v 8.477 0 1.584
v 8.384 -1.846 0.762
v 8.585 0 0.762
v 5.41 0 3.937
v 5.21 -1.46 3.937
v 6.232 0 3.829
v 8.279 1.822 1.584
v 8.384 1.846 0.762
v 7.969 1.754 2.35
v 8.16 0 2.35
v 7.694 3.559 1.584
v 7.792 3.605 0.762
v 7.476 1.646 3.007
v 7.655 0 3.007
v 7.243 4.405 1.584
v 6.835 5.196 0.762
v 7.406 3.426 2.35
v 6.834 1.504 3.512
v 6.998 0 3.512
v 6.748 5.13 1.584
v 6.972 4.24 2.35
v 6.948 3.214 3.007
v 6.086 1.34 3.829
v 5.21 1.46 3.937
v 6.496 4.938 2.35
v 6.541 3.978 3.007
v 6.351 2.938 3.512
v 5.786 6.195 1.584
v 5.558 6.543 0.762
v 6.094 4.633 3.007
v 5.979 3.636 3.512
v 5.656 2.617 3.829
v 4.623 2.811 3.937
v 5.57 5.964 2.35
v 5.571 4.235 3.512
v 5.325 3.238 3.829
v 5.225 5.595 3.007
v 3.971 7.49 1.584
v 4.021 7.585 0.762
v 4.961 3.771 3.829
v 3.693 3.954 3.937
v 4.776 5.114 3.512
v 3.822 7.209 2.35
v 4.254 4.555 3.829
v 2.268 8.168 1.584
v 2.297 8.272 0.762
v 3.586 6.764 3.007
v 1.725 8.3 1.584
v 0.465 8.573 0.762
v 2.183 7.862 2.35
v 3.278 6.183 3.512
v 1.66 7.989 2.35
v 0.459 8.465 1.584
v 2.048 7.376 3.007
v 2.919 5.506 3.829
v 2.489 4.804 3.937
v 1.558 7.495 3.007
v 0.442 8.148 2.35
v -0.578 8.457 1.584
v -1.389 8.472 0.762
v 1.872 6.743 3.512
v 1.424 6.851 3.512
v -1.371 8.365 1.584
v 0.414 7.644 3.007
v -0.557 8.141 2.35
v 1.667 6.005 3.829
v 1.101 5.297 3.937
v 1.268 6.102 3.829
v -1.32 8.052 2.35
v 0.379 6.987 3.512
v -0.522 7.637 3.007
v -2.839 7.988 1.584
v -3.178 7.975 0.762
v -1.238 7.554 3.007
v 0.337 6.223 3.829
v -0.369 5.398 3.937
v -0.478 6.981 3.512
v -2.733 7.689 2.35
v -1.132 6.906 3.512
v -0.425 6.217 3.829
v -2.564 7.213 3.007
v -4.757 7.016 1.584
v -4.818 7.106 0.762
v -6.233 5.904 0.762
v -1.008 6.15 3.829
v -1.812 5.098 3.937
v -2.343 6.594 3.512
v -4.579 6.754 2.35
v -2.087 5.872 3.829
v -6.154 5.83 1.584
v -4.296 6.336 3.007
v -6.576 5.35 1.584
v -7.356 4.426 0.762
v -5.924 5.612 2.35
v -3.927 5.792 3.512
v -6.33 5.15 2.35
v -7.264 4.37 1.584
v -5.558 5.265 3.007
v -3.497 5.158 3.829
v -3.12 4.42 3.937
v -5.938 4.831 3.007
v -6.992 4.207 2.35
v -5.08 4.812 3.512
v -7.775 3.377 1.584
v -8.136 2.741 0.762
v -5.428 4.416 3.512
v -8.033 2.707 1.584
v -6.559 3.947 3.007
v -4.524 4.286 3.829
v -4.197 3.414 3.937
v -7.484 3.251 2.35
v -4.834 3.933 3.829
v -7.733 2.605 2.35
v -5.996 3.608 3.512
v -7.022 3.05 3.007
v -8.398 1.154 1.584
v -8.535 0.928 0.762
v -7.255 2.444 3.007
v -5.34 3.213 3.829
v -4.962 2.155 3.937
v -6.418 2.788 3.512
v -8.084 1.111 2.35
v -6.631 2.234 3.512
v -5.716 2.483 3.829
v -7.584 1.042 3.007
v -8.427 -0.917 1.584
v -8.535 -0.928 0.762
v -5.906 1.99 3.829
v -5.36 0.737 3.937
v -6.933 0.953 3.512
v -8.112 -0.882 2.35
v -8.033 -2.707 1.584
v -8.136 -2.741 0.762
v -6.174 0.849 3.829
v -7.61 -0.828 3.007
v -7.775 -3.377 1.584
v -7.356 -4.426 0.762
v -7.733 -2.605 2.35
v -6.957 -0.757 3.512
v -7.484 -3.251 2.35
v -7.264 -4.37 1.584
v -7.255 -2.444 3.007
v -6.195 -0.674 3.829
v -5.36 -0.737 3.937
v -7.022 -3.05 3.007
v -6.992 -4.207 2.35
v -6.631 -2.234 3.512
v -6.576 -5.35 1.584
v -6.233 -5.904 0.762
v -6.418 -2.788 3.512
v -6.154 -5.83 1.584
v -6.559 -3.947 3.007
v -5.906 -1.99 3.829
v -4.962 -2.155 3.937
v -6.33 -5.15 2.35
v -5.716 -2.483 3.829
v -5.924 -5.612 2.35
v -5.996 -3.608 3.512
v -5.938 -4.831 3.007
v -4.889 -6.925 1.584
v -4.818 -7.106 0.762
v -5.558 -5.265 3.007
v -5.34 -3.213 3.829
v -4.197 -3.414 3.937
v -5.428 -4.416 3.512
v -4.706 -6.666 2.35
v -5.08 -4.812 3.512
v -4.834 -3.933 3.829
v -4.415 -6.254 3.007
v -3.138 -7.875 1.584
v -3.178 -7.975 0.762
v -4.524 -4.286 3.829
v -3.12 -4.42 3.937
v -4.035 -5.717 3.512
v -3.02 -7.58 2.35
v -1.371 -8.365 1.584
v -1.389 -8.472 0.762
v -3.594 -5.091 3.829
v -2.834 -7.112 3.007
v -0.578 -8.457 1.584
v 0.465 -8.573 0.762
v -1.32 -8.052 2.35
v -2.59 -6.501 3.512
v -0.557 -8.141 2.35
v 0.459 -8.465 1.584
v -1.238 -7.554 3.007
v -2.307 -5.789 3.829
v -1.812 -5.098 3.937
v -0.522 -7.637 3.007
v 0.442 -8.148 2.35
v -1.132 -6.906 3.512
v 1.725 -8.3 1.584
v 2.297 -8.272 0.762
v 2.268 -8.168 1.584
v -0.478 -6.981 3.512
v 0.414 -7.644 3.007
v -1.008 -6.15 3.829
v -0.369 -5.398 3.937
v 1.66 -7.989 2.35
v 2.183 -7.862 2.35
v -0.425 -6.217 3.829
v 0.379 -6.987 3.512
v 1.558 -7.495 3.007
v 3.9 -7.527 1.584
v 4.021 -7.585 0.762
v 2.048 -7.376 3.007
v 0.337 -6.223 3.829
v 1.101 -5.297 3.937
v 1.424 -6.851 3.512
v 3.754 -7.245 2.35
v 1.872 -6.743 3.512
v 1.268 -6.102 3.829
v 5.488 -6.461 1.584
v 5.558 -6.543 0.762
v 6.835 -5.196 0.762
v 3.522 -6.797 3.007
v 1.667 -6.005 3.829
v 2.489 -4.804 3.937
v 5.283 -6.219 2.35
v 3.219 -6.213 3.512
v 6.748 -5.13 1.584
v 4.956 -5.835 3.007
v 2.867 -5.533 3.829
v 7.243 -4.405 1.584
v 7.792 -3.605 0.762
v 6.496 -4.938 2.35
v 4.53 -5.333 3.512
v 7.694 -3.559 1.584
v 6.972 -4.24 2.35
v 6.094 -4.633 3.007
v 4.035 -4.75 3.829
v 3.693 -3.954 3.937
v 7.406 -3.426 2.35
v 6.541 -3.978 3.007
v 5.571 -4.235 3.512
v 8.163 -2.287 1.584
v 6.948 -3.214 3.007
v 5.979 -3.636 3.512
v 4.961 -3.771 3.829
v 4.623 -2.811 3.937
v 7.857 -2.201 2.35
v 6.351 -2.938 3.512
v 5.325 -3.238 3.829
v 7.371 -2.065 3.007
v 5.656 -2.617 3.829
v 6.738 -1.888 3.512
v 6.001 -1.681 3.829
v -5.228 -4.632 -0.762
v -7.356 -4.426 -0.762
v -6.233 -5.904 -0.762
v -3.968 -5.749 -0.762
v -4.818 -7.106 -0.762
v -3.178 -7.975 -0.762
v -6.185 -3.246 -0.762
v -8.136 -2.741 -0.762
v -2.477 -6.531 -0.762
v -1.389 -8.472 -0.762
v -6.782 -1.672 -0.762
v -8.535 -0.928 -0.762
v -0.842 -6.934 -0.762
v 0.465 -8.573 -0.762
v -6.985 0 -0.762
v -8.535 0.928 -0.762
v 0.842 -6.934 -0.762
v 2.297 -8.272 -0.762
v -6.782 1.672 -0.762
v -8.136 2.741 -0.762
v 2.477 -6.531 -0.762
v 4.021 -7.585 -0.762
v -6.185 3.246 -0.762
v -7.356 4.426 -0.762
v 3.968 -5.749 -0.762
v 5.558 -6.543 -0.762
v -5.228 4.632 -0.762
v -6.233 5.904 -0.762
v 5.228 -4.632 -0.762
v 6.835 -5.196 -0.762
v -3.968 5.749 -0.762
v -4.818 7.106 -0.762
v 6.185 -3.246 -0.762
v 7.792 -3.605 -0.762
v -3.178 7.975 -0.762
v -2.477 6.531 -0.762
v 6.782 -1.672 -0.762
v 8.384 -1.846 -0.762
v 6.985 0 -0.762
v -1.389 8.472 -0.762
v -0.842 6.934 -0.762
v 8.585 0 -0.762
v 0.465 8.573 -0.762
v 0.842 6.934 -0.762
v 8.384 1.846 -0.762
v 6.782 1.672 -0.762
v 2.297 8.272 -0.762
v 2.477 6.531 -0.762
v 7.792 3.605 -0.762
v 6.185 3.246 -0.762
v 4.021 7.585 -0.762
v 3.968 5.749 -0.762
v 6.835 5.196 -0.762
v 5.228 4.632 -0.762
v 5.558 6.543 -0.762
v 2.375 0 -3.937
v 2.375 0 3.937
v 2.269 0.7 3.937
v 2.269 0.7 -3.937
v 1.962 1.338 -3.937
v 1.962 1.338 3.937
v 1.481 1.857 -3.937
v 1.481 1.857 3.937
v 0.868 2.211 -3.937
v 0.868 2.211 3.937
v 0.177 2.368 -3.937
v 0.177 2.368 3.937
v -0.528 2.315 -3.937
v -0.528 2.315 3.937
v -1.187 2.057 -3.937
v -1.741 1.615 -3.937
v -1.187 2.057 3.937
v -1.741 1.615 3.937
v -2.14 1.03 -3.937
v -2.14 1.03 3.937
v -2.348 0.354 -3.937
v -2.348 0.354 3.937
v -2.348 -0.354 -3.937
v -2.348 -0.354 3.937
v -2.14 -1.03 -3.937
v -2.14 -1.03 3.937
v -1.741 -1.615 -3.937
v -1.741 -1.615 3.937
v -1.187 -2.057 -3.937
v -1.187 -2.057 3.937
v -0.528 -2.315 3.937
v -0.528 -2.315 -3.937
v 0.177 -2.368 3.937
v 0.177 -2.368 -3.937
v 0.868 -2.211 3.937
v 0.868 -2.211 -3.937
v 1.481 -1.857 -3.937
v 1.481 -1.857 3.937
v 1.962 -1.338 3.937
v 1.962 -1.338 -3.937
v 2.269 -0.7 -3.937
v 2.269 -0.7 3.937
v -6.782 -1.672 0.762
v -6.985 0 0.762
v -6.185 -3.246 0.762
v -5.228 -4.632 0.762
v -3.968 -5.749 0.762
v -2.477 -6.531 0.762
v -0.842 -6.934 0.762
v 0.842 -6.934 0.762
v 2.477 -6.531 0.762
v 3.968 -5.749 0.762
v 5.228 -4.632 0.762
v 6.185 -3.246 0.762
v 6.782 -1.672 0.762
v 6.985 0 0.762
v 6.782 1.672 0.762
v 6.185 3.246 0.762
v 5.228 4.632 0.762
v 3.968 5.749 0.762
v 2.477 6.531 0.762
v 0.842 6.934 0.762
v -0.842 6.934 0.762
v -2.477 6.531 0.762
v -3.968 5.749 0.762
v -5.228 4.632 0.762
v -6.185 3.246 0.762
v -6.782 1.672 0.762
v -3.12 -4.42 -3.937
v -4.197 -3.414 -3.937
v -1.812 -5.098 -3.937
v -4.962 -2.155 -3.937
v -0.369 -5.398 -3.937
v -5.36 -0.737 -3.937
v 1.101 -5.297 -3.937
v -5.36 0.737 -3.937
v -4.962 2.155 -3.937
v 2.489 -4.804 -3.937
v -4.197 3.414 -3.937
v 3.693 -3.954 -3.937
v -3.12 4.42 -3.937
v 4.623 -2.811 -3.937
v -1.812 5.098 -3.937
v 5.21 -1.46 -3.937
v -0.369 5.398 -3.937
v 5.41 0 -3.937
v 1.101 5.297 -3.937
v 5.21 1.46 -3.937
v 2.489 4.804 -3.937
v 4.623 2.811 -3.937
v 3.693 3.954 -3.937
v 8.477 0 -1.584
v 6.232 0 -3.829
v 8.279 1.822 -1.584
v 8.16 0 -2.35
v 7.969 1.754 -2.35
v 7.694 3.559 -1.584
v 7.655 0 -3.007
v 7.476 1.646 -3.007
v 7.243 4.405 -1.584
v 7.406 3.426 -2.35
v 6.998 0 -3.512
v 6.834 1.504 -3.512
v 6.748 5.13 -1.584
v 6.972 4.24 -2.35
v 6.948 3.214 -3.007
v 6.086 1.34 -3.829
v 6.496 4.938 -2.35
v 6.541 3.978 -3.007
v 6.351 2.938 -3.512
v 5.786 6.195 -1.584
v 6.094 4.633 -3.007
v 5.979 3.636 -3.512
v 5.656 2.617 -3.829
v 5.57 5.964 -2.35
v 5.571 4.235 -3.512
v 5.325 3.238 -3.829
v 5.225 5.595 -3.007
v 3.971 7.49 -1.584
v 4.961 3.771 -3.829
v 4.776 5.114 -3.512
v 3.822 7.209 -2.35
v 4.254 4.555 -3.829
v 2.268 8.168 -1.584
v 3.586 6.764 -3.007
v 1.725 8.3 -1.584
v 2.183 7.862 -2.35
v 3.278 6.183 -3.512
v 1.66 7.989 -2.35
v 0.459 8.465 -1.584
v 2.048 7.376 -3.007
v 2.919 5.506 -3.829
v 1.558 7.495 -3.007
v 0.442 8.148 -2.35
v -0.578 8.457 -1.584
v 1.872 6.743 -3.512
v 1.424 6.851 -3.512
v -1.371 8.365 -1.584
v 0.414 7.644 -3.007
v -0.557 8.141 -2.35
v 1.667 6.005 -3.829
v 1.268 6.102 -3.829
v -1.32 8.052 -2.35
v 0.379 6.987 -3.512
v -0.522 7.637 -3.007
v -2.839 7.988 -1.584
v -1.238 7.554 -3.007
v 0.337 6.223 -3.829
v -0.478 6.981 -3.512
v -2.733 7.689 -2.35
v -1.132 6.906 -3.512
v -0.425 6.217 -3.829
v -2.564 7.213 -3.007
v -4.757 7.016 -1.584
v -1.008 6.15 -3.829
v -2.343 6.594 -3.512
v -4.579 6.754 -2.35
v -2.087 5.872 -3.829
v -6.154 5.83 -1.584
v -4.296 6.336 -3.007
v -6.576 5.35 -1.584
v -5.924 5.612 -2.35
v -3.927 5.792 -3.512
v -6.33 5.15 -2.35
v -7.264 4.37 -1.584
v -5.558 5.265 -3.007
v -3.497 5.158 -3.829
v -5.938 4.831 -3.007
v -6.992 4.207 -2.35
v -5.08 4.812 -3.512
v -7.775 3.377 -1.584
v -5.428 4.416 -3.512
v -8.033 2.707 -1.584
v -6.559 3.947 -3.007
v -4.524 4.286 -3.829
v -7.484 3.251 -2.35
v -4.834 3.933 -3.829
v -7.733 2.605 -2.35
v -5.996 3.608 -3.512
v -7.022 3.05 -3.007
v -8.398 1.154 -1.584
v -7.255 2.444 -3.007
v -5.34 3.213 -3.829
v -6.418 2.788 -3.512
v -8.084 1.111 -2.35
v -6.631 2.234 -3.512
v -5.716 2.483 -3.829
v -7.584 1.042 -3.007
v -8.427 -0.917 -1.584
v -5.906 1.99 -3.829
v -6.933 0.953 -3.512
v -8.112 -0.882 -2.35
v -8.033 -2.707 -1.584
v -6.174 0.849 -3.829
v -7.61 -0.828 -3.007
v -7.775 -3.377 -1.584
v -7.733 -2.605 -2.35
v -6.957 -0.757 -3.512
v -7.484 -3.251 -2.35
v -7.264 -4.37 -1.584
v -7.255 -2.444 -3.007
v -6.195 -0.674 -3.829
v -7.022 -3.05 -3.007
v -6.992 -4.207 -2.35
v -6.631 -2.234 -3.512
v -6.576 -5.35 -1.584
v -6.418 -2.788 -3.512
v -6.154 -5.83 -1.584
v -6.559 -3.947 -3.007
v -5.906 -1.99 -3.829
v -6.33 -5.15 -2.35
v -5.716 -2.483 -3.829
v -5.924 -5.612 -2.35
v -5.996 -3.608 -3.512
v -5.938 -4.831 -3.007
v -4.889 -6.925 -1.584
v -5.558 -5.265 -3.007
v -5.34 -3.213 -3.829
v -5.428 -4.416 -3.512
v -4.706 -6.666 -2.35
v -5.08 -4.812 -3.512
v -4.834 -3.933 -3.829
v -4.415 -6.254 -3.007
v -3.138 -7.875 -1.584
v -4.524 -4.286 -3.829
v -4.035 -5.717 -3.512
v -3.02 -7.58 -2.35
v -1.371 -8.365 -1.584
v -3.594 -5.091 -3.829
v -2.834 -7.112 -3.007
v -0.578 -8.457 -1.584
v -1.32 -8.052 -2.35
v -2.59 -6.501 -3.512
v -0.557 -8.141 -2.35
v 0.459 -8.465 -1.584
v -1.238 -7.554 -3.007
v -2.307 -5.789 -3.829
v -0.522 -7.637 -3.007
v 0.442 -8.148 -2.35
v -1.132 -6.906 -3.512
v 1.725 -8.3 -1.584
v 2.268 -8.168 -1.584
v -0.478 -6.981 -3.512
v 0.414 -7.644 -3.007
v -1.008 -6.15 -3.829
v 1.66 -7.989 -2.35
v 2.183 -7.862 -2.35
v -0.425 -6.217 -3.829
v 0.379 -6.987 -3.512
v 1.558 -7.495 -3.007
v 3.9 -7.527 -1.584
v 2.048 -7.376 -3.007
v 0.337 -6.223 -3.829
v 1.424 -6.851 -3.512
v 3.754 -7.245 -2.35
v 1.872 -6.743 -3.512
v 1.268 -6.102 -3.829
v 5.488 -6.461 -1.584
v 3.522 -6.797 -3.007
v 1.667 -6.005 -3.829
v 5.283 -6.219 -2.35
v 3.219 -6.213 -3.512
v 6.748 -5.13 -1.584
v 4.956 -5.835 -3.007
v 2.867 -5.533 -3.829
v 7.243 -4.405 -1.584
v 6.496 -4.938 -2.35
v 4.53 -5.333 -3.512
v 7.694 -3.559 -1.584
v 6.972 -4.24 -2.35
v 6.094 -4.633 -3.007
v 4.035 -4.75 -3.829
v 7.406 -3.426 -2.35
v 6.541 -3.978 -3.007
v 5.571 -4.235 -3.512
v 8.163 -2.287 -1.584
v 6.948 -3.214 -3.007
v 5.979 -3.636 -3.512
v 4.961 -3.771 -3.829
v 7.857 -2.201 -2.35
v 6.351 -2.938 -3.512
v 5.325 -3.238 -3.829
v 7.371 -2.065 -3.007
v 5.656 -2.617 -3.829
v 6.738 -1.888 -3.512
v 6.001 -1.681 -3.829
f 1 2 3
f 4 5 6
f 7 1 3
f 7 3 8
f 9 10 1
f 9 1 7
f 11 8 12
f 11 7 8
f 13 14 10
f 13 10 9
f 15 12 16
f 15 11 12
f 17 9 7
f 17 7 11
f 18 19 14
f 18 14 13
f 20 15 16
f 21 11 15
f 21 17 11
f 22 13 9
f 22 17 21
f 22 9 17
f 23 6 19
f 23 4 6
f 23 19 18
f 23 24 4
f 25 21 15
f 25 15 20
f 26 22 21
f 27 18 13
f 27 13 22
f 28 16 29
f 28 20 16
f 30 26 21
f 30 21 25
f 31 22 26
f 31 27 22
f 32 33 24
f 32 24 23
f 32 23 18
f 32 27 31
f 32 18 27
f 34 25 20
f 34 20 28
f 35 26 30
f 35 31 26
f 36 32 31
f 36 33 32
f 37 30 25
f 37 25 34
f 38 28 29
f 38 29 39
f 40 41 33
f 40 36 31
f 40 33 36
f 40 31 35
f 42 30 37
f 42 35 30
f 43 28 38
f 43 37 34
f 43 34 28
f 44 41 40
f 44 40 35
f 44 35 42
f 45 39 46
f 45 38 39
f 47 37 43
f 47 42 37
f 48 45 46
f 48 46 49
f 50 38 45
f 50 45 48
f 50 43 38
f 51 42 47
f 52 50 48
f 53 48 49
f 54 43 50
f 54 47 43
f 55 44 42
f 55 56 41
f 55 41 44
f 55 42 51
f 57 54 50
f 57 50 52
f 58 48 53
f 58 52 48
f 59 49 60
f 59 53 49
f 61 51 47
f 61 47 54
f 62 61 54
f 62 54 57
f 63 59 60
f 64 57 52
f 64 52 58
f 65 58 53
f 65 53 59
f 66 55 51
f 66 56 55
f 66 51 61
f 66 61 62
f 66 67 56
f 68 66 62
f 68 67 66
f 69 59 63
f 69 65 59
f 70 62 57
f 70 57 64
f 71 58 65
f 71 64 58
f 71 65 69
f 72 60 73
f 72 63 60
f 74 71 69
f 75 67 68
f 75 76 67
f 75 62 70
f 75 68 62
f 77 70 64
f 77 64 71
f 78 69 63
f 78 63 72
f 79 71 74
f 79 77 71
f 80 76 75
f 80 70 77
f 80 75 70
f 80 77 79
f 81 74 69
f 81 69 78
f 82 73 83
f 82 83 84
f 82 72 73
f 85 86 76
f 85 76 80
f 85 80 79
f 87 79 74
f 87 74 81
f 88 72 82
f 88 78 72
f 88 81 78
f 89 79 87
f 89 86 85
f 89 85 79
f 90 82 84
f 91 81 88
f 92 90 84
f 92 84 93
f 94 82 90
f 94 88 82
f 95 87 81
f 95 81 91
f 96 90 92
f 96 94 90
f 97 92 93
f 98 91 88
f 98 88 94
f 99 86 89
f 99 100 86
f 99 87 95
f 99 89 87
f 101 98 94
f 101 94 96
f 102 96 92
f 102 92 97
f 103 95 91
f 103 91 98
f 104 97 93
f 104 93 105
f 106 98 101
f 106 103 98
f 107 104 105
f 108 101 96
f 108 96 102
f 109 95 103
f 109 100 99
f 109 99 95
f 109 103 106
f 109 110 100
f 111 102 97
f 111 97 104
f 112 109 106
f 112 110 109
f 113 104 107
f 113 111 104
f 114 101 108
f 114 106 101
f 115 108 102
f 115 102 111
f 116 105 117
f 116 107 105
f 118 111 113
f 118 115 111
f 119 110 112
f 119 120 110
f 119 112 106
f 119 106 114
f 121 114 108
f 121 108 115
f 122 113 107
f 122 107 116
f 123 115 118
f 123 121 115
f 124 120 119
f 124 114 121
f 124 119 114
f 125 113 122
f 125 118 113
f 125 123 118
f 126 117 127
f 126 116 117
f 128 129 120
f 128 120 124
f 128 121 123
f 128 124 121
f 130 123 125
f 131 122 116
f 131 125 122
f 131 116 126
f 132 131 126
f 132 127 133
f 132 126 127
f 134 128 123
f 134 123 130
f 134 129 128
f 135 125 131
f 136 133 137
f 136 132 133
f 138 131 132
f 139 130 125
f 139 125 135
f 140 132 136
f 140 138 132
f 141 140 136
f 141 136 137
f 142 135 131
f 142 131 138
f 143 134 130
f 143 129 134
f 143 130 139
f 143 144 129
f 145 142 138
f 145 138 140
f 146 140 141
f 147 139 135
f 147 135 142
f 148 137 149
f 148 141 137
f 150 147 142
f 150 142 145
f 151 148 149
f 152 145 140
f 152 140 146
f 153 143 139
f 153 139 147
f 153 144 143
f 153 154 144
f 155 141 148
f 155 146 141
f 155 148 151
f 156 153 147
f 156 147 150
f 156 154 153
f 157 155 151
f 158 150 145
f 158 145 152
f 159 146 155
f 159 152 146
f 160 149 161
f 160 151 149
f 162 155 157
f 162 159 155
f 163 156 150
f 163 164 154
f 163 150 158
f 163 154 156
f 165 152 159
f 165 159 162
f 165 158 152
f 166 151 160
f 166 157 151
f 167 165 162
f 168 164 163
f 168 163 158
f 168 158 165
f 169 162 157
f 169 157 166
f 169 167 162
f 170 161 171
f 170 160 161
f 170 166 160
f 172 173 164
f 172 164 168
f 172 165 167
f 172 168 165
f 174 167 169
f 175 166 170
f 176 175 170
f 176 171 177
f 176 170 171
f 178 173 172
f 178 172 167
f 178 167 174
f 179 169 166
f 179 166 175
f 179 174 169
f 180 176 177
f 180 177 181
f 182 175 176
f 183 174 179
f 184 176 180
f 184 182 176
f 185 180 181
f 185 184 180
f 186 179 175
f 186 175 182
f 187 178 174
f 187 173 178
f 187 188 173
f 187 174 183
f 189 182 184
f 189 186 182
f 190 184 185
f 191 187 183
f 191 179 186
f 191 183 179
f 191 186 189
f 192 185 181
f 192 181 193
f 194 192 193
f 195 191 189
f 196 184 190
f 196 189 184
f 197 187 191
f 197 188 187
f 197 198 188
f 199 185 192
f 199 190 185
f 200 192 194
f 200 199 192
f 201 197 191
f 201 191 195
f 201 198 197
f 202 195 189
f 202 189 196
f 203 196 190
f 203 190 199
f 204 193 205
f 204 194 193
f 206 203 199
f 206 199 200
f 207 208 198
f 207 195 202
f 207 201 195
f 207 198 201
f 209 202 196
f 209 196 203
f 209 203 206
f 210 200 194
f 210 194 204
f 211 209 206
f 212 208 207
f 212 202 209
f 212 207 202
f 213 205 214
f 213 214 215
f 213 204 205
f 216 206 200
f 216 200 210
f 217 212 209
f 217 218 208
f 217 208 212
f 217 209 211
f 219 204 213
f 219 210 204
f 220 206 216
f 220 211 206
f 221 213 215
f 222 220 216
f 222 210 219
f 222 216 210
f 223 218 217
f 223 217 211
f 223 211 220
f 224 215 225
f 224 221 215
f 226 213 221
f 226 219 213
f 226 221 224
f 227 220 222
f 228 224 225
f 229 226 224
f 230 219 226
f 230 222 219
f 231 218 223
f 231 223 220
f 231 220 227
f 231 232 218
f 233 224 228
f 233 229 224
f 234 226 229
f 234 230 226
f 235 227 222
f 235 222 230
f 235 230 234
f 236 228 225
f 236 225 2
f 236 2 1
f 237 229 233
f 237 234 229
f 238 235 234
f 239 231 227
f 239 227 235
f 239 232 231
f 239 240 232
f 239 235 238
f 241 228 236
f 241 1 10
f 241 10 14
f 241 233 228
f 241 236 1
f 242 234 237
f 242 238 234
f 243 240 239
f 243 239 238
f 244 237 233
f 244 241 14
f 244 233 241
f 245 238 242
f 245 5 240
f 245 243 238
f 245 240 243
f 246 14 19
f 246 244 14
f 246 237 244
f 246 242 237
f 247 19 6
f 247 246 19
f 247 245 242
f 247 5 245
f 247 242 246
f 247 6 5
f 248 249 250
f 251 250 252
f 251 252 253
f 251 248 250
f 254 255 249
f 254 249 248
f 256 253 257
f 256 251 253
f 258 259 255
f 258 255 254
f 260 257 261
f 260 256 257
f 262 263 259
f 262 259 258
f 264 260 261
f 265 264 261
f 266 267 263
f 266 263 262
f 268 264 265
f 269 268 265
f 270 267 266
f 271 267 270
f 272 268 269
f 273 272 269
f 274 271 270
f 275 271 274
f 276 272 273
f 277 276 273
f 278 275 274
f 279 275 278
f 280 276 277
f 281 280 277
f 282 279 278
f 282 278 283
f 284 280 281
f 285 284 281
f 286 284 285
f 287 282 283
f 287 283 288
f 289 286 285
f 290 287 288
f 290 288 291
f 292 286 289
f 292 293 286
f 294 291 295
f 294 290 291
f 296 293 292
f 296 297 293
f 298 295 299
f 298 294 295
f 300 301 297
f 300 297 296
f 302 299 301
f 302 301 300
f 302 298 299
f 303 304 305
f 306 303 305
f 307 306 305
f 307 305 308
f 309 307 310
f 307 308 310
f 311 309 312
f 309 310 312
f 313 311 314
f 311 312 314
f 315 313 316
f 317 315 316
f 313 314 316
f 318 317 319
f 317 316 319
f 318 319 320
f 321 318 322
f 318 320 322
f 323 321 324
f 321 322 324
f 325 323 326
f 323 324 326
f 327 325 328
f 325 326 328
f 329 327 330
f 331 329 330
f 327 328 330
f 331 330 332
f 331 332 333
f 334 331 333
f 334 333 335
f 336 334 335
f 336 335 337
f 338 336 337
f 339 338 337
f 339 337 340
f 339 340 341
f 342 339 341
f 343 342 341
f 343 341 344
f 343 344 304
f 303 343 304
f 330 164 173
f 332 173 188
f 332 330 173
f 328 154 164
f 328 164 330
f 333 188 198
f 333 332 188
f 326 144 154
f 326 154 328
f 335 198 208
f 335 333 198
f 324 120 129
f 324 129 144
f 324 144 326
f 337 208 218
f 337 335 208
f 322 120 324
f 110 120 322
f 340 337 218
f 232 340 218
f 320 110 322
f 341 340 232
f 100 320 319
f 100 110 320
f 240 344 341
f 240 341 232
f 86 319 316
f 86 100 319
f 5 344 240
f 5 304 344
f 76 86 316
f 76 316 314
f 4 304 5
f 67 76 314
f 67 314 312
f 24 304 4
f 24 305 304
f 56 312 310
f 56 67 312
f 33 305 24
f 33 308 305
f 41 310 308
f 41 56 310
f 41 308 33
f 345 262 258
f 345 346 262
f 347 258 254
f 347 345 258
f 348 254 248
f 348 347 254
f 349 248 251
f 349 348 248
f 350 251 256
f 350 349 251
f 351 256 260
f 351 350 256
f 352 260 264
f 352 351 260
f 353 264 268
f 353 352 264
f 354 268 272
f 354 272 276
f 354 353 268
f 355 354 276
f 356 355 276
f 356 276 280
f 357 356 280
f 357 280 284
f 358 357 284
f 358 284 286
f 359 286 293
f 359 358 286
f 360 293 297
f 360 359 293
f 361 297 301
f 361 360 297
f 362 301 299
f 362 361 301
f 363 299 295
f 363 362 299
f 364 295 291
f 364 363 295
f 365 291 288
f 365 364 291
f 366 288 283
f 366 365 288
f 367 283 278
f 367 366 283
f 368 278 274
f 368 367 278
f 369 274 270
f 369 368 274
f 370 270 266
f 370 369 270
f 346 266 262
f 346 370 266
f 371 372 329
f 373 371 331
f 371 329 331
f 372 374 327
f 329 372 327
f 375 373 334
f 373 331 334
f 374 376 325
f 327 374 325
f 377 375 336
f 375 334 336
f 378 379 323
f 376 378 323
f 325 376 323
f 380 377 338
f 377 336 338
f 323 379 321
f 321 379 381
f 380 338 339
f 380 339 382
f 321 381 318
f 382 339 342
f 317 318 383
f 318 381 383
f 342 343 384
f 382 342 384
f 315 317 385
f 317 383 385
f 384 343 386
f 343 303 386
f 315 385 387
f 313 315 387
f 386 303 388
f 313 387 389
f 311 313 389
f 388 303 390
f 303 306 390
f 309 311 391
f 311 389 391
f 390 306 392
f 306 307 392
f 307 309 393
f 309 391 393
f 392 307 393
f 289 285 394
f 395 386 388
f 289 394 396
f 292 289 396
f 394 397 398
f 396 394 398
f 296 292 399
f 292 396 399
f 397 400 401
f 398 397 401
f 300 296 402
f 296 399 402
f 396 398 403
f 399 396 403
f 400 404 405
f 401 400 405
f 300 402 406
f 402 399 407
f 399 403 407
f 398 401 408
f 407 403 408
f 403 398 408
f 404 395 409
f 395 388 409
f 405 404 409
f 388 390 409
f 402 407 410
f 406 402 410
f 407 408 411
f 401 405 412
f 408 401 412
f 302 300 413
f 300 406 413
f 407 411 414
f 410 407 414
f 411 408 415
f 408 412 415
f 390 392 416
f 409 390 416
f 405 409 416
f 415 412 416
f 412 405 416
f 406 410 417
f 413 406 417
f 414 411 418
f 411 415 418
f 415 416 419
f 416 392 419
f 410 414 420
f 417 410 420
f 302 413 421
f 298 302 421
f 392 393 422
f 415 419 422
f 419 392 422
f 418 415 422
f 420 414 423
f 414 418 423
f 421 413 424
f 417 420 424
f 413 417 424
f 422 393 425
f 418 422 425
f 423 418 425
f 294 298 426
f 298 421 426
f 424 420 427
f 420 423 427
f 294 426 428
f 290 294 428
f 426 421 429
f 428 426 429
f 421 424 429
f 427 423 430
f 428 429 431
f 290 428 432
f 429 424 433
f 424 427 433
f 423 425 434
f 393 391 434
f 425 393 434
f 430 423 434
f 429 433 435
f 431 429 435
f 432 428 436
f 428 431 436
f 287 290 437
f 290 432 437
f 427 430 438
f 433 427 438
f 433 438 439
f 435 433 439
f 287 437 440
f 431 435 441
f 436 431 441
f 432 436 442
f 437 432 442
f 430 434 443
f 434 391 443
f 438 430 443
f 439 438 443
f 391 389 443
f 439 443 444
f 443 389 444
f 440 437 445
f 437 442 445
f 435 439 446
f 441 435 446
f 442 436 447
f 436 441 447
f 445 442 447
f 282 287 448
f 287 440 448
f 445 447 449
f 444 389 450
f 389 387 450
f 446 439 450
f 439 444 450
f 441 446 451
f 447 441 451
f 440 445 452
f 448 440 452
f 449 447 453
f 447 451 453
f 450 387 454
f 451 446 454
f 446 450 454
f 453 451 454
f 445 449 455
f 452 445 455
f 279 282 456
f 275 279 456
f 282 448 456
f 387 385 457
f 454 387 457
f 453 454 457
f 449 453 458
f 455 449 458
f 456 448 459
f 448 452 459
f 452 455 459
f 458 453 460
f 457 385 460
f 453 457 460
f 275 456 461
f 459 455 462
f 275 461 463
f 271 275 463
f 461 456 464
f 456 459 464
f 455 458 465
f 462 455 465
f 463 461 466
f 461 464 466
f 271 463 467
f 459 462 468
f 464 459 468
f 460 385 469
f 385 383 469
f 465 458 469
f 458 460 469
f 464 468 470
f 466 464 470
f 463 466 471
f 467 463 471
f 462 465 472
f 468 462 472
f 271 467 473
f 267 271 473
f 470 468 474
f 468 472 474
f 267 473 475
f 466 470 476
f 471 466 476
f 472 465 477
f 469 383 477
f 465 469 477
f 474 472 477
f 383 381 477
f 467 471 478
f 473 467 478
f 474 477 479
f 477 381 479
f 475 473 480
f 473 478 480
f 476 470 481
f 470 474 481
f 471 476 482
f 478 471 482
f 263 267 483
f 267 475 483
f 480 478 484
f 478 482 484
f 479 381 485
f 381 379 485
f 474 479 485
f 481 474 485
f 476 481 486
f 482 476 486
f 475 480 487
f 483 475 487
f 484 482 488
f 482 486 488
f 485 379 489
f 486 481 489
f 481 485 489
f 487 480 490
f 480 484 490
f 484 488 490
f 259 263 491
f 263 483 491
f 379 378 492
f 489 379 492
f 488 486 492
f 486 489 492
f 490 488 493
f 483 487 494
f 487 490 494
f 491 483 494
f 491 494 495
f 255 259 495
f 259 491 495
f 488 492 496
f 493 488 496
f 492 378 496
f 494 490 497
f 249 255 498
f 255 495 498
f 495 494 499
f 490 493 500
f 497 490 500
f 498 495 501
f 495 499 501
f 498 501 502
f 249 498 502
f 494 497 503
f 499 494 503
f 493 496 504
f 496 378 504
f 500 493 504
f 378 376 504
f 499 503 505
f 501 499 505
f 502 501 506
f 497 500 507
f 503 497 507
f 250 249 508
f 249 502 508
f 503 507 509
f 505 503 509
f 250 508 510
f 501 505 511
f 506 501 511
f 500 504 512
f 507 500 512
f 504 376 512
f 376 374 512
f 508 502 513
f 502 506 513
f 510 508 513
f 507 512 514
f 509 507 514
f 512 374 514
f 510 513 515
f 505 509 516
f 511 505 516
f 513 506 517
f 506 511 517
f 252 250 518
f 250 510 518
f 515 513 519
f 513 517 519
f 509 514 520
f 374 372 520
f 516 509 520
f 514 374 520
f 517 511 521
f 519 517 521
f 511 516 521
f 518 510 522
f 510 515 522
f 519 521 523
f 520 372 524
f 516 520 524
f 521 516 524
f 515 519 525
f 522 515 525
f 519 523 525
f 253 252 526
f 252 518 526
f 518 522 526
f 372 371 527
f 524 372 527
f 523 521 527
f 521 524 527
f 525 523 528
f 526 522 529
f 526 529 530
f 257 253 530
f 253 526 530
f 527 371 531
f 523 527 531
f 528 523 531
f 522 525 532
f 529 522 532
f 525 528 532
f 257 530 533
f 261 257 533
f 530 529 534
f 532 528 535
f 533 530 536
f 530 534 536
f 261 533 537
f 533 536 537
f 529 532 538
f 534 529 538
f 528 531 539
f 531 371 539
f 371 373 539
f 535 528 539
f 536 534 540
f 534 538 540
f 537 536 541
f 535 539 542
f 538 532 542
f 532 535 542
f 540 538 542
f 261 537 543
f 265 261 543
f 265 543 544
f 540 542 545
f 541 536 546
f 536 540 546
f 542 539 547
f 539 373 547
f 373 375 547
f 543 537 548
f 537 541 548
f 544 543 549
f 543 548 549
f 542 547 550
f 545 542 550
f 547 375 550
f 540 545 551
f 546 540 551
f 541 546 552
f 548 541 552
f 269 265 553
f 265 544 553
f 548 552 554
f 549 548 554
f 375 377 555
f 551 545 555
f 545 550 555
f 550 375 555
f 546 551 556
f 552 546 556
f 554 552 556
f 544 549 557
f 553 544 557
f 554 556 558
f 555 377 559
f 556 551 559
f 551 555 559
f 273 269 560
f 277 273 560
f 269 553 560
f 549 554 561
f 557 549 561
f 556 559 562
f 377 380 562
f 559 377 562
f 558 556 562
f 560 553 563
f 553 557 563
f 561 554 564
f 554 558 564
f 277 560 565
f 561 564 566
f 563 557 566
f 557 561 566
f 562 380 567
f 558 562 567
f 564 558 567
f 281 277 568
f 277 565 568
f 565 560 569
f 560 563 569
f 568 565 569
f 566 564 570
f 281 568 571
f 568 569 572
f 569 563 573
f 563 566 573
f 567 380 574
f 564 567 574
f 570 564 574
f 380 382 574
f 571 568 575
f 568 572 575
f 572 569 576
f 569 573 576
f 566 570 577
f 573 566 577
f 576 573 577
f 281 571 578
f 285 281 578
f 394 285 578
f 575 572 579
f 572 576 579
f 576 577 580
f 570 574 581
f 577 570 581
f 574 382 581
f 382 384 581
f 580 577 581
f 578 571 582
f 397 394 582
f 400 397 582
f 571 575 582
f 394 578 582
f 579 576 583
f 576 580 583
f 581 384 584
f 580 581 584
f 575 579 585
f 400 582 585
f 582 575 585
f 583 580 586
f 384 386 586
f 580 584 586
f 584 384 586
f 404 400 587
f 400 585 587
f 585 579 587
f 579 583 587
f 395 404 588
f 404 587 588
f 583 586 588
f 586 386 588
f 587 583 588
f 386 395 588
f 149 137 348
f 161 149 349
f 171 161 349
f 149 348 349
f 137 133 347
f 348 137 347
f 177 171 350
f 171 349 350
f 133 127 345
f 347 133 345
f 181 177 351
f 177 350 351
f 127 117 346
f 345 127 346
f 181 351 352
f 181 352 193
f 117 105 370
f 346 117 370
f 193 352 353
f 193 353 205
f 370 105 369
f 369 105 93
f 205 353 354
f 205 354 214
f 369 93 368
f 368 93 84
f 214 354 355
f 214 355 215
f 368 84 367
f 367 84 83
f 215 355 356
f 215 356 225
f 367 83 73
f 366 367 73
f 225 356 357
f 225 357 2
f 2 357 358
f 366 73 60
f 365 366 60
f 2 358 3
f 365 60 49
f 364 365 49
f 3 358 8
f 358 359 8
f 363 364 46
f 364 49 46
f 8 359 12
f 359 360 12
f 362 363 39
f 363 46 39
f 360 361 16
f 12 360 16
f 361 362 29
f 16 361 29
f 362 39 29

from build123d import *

# Parameters (mm, degrees)
SKETCH3_R            = 6.985
BASE_EXTRUDE_DEPTH   = 0.762
SKETCH4_R            = 8.5852
BOSS_EXTRUDE2_DEPTH  = 3.175
FILLET1_R            = 3.175
FILLET1_OF_MIRROR1_R = 3.175
SKETCH5_R            = 2.3749
CUT_EXTRUDE1_DEPTH   = 15.47104687


with BuildPart() as part:
    # Sketch3 → Base-Extrude (new, symmetric)
    with BuildSketch(Plane.XY):
        with Locations(Location((0, 0, 0), (0, 0, 180))):
            Circle(SKETCH3_R)
    extrude(amount=BASE_EXTRUDE_DEPTH, both=True)

    # Sketch4 → Boss-Extrude2 (add)
    with BuildSketch(Plane.XY.offset(0.762)):
        Circle(SKETCH4_R)
    boss_extrude2 = extrude(amount=BOSS_EXTRUDE2_DEPTH)

    # Fillet1
    fillet1_edges = [part.edges().sort_by_distance(p)[0] for p in [
        (-8.5852, 0, 3.937),
    ]]
    fillet(fillet1_edges, radius=FILLET1_R - 0.0001)  # a hair under: the kernel refuses the full size

    # Mirror1: Boss-Extrude2 across plane
    add(boss_extrude2.mirror(Plane.XY))

    # Fillet1 of Mirror1
    fillet1_of_mirror1_edges = [part.edges().sort_by_distance(p)[0] for p in [
        (-8.5852, 0, -3.937),
    ]]
    fillet(fillet1_of_mirror1_edges, radius=FILLET1_OF_MIRROR1_R - 0.0001)  # a hair under: the kernel refuses the full size

    # Sketch5 → Cut-Extrude1 (cut, through all)
    with BuildSketch(Plane.XY.offset(3.937)):
        Circle(SKETCH5_R)
    extrude(amount=-CUT_EXTRUDE1_DEPTH, mode=Mode.SUBTRACT)


solid = part.part
